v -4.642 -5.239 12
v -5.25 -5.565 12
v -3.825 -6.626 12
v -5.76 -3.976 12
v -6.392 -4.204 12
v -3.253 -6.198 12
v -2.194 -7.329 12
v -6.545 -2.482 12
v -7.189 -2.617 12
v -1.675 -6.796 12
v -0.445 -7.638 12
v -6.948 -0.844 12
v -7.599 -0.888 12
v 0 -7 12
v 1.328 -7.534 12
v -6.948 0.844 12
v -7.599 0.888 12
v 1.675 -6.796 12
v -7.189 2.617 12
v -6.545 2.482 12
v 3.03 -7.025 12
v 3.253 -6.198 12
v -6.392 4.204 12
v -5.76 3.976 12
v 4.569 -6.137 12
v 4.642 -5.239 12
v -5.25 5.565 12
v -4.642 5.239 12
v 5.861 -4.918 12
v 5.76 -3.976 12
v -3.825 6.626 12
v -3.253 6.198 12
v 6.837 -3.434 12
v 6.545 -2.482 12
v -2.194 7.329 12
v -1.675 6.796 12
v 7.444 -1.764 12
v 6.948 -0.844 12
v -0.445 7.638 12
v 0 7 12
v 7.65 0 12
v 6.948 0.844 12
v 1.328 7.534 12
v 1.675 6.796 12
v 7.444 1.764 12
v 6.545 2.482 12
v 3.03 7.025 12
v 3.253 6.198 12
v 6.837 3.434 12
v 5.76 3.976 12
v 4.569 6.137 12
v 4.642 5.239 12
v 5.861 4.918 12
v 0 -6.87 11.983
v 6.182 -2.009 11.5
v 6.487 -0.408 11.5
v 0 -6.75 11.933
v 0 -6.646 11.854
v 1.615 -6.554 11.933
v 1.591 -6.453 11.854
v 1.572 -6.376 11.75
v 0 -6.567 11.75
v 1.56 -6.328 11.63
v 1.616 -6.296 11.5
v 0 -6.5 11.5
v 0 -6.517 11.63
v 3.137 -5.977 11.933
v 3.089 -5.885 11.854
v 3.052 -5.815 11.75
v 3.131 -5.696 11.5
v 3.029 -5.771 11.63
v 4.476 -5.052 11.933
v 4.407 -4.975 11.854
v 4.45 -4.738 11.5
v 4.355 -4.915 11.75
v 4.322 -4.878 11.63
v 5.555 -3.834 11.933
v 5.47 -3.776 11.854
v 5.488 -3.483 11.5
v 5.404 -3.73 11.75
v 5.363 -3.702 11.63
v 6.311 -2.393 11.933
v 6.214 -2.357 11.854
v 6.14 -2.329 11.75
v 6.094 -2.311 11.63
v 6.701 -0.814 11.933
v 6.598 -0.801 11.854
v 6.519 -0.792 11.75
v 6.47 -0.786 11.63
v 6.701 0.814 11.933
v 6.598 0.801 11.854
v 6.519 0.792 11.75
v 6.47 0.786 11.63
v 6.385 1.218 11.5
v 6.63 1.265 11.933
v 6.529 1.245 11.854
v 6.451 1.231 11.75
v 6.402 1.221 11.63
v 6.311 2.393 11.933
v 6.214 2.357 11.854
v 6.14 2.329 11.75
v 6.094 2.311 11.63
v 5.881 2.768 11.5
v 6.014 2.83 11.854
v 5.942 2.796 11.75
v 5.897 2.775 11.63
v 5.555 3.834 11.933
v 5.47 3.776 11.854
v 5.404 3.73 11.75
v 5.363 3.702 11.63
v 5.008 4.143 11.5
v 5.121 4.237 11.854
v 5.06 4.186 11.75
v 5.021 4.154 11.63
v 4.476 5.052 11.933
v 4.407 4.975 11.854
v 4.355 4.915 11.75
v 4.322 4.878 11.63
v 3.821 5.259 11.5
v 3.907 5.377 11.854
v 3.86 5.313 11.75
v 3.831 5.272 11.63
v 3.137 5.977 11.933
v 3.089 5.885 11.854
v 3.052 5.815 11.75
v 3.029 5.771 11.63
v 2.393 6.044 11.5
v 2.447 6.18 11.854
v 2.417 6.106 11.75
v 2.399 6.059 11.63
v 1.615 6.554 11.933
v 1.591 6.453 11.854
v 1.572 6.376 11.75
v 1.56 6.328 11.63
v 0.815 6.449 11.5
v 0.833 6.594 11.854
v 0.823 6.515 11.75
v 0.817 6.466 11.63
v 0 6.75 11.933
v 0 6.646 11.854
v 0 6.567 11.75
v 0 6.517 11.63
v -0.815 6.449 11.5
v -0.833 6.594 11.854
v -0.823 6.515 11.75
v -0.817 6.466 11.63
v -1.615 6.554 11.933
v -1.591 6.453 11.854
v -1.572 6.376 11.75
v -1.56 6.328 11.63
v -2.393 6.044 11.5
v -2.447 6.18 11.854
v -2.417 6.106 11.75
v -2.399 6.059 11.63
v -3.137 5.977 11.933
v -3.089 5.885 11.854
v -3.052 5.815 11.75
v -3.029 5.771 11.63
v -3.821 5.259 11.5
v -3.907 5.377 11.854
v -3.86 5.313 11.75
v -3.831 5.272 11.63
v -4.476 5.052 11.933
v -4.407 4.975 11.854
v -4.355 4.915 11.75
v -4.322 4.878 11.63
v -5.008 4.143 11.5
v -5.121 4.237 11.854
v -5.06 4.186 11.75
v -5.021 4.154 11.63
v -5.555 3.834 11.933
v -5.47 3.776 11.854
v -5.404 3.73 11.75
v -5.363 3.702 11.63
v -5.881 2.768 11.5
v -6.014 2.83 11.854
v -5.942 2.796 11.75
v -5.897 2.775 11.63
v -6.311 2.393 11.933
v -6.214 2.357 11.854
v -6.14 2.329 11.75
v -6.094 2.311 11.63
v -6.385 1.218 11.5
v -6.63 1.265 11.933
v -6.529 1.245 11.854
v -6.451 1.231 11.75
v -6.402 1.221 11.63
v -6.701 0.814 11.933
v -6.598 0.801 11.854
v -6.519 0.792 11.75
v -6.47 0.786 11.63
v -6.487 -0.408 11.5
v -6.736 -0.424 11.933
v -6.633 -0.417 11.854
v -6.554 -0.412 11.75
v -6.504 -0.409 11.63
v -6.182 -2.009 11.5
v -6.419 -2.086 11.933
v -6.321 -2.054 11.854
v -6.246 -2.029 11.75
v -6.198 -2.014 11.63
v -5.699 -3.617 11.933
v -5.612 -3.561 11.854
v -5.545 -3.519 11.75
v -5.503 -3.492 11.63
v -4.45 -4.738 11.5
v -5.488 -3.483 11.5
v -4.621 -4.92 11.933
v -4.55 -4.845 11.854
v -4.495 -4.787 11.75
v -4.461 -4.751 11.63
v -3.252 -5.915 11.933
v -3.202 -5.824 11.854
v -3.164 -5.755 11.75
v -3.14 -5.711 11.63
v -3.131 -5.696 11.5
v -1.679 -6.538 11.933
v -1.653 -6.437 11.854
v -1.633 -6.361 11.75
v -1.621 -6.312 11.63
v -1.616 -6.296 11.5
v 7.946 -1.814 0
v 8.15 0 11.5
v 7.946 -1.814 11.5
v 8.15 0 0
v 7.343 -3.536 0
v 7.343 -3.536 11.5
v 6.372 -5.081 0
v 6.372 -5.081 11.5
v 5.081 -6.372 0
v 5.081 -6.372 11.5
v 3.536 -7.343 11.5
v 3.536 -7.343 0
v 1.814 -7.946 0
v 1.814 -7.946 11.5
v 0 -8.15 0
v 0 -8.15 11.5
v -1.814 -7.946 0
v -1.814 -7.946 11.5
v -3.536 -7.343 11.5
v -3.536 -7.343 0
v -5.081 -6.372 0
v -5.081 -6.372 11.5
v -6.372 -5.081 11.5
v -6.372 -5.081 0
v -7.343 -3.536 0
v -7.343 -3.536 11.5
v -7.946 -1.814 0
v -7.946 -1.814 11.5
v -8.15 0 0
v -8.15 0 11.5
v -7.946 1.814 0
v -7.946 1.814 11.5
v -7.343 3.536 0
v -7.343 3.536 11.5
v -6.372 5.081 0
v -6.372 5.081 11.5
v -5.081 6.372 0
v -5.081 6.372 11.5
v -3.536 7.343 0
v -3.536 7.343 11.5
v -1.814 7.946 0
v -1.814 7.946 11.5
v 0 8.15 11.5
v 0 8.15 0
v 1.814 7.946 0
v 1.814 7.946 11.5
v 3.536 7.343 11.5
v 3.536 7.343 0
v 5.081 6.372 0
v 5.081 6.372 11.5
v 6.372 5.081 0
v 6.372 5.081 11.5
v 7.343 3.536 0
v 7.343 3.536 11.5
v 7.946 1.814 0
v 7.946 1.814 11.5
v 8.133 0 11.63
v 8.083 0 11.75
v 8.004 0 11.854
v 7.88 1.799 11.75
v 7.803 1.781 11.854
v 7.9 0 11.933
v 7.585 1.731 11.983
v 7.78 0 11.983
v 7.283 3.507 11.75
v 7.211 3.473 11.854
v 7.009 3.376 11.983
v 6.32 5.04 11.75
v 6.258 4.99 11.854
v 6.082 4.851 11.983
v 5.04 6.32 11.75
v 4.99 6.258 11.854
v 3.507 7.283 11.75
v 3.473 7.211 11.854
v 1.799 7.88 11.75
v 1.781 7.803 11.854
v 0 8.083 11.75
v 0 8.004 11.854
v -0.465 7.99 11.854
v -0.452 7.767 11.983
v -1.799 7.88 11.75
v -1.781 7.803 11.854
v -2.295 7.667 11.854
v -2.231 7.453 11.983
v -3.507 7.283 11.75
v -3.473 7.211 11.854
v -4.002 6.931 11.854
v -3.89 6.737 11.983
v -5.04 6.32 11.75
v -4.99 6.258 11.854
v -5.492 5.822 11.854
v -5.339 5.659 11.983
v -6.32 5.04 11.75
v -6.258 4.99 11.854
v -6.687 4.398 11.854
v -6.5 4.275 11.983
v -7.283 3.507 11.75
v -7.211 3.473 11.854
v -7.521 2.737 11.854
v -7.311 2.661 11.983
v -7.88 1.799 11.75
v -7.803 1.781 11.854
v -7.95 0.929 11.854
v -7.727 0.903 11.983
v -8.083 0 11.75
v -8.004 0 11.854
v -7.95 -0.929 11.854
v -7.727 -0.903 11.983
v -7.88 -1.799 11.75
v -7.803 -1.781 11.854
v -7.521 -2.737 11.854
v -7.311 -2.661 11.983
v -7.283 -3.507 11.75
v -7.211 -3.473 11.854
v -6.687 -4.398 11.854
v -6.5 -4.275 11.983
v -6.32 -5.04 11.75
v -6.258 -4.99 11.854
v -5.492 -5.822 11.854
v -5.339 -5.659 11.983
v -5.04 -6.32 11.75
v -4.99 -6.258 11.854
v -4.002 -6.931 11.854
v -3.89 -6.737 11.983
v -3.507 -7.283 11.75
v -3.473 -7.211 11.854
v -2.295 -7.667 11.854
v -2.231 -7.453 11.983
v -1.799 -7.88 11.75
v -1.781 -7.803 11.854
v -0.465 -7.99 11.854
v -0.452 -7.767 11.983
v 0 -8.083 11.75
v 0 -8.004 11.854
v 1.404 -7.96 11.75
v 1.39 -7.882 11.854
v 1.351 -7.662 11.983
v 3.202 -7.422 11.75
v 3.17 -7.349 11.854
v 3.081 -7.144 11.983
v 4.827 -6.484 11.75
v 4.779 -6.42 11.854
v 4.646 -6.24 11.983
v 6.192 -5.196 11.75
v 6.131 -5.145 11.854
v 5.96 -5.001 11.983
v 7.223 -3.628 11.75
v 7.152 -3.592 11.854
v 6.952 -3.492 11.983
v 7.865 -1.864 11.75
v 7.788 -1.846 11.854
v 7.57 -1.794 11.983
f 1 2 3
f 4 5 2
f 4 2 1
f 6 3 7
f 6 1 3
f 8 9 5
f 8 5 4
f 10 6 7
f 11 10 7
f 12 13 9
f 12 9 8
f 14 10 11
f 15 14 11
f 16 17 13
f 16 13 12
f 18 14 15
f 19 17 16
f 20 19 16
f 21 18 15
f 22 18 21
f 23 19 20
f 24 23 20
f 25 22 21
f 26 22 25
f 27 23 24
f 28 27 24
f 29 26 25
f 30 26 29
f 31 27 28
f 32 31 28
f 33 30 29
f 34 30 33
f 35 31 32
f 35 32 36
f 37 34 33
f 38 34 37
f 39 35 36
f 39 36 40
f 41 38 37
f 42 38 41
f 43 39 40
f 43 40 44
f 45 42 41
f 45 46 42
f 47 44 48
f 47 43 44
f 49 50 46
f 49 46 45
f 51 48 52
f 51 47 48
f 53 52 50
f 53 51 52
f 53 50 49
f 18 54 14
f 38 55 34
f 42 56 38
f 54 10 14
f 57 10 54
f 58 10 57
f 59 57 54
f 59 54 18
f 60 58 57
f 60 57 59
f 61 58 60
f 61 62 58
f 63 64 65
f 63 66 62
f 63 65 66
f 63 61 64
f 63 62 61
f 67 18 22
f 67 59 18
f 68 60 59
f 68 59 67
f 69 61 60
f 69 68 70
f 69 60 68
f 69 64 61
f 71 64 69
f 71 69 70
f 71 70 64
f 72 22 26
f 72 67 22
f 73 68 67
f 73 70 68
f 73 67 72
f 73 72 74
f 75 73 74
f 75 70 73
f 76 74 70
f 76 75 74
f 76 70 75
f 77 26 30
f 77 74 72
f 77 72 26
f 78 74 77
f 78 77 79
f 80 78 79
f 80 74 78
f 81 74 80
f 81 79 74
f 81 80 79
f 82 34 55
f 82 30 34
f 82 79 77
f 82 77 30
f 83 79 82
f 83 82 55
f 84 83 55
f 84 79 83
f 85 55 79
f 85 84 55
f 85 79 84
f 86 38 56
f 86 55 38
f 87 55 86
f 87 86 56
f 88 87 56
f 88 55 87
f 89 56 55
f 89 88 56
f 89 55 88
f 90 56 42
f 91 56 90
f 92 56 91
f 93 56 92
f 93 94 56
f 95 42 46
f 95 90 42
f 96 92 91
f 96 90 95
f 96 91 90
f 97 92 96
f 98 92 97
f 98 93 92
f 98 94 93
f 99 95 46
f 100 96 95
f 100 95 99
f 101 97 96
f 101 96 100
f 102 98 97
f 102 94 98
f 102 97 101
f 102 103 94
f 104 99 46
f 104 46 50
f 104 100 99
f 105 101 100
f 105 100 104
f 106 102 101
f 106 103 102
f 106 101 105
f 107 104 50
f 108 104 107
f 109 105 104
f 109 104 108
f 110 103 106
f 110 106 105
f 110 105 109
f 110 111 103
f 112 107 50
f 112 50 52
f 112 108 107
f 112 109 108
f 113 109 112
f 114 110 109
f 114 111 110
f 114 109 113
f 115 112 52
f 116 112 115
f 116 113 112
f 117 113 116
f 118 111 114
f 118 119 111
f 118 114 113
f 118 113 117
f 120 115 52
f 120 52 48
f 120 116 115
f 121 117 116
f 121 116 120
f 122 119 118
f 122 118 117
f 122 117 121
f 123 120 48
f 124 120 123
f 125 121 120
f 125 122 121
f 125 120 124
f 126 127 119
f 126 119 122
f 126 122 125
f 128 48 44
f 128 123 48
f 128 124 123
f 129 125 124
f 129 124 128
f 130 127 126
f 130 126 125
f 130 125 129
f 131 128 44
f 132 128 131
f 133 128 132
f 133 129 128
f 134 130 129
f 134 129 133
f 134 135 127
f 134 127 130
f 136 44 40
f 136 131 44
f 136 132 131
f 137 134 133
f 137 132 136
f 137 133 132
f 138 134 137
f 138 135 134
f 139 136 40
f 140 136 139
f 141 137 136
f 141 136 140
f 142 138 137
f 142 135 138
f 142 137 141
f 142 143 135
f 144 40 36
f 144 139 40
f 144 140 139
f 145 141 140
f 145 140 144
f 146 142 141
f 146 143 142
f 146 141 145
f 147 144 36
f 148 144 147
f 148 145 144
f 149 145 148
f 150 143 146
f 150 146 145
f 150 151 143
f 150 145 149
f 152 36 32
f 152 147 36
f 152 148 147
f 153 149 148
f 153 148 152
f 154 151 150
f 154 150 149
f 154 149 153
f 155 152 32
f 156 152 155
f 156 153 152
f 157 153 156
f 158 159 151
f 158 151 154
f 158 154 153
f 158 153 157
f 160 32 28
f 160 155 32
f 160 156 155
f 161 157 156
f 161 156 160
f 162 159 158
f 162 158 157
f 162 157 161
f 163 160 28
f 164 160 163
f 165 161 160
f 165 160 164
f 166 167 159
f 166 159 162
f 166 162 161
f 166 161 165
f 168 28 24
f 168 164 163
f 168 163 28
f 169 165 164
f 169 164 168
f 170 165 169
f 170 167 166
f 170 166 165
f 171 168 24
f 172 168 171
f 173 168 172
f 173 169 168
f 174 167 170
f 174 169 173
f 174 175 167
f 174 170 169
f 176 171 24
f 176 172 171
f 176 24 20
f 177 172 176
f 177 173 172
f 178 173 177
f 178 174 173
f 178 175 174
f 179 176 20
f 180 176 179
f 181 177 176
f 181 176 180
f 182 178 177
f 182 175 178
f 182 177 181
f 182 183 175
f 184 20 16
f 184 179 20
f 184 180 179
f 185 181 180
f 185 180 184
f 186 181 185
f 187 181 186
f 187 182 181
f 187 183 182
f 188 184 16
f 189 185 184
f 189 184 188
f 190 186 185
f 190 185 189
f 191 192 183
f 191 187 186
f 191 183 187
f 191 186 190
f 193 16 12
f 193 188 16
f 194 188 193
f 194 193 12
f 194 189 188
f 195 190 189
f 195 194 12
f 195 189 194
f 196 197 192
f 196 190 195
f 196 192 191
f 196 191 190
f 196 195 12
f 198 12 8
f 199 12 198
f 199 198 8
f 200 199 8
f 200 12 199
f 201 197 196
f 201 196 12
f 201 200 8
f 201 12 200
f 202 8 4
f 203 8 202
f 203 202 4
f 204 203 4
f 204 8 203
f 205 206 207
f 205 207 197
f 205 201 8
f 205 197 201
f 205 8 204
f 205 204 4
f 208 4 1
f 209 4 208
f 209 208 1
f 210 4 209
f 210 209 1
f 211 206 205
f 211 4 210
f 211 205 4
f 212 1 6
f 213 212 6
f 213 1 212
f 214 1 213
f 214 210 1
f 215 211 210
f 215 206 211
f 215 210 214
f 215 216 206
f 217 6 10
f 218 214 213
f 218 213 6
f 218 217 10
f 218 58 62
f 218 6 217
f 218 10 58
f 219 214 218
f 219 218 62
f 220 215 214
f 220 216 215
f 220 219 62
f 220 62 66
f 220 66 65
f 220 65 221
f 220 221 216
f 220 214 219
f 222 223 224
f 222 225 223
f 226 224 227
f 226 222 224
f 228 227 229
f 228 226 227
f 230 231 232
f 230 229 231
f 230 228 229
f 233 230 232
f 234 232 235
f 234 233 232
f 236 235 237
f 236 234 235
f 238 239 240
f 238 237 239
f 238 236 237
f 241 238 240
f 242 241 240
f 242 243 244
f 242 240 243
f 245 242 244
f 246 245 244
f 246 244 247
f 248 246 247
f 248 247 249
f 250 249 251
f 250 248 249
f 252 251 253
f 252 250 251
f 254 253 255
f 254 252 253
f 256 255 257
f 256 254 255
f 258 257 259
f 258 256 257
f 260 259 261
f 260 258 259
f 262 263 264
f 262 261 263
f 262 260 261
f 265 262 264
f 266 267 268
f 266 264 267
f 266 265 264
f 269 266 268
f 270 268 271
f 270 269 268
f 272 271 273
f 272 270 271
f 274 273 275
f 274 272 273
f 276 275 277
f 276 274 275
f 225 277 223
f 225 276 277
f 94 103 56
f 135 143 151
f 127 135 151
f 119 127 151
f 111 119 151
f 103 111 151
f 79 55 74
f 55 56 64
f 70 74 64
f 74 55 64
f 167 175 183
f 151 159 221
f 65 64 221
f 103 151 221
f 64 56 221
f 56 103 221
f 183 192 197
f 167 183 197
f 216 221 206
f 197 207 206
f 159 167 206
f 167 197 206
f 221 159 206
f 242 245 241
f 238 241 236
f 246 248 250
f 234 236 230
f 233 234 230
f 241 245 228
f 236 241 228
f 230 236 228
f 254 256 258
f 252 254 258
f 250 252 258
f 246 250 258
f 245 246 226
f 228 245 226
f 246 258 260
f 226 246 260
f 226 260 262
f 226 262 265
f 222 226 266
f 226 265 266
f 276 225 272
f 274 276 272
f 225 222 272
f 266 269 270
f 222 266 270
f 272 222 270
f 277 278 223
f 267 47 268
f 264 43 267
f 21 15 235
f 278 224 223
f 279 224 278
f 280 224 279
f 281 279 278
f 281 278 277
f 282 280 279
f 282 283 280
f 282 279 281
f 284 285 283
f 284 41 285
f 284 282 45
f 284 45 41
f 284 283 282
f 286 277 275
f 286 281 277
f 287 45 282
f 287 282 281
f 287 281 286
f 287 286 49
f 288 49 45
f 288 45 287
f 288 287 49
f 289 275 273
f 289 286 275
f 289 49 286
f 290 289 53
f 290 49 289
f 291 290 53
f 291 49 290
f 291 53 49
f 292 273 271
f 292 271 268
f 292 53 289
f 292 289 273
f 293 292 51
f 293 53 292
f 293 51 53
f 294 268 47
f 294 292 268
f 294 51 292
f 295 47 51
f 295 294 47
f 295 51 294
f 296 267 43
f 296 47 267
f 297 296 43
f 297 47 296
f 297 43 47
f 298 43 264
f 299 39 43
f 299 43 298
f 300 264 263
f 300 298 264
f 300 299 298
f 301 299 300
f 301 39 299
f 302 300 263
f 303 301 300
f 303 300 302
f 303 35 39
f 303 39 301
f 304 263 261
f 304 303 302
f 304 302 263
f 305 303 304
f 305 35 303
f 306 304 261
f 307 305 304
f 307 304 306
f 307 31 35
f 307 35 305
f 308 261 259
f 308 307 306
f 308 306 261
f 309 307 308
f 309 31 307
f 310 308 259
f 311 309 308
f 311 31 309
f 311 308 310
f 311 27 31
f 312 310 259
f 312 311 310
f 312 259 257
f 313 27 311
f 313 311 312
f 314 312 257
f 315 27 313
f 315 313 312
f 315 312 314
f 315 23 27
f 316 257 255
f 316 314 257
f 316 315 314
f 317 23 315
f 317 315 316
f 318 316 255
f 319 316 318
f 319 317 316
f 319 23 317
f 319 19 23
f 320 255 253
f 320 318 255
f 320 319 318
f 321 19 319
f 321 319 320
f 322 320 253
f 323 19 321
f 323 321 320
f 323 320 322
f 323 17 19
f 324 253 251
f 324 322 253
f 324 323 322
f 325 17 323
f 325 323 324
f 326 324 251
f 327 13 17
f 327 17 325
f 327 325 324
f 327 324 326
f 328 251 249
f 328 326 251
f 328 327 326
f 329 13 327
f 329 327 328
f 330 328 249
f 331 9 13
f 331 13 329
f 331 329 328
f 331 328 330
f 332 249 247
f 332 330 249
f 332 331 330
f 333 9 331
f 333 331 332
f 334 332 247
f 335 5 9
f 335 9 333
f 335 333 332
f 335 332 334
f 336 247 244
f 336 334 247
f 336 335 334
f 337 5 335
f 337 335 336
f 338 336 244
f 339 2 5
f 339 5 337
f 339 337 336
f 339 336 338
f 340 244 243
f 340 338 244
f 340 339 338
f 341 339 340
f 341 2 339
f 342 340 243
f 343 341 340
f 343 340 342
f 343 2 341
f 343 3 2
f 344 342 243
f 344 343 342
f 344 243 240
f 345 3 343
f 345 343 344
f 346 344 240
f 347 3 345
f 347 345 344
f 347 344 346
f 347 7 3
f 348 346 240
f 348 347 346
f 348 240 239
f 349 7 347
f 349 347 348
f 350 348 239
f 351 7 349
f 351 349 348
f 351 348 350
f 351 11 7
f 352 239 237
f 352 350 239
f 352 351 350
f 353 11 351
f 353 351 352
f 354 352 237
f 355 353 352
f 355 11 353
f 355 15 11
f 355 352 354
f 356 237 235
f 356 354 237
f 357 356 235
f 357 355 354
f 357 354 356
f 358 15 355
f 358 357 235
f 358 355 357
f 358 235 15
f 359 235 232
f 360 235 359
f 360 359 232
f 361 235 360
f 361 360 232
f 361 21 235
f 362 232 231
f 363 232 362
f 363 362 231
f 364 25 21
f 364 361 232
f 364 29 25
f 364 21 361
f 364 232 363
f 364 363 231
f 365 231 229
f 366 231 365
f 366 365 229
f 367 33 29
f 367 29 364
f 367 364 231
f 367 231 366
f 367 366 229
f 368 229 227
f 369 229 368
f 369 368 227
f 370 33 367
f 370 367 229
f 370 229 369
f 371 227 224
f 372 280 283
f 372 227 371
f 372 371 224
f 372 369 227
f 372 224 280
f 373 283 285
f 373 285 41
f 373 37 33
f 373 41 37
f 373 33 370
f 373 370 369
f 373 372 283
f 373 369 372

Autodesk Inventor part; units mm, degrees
ref_plane "YZ Plane" through (0, 0, 0) normal (1, 0, 0) x (0, 1, 0)
ref_plane "XZ Plane" through (0, 0, 0) normal (0, 1, 0) x (-1, 0, 0)
ref_plane "XY Plane" through (0, 0, 0) normal (0, 0, 1) x (1, 0, 0)
sketch "Sketch1" plane through (0, 0, 0) normal (0, 0, 1) x (1, 0, 0)
  circle A0 centre (0, 0) radius 8.15
  dimension "d0" = 16.3
extrude "Extrusion1" add sketch "Sketch1" along normal blind 12
sketch "Sketch2" plane through (0, 0, 12) normal (0, 0, 1) x (1, 0, 0)
  circle A0 centre (0, 0) radius 8.15 projected
hole "Hole1" at (0, 0, 12) direction (0, 0, -1) diameter 13 depth 0.5
fillet "Fillet1" radius 0.5 2 edges at (-8.15, 0, 12) (0, 6.5, 12)
properties part number "Parallax_Ping_Transducer" material "ABS Plastic"
